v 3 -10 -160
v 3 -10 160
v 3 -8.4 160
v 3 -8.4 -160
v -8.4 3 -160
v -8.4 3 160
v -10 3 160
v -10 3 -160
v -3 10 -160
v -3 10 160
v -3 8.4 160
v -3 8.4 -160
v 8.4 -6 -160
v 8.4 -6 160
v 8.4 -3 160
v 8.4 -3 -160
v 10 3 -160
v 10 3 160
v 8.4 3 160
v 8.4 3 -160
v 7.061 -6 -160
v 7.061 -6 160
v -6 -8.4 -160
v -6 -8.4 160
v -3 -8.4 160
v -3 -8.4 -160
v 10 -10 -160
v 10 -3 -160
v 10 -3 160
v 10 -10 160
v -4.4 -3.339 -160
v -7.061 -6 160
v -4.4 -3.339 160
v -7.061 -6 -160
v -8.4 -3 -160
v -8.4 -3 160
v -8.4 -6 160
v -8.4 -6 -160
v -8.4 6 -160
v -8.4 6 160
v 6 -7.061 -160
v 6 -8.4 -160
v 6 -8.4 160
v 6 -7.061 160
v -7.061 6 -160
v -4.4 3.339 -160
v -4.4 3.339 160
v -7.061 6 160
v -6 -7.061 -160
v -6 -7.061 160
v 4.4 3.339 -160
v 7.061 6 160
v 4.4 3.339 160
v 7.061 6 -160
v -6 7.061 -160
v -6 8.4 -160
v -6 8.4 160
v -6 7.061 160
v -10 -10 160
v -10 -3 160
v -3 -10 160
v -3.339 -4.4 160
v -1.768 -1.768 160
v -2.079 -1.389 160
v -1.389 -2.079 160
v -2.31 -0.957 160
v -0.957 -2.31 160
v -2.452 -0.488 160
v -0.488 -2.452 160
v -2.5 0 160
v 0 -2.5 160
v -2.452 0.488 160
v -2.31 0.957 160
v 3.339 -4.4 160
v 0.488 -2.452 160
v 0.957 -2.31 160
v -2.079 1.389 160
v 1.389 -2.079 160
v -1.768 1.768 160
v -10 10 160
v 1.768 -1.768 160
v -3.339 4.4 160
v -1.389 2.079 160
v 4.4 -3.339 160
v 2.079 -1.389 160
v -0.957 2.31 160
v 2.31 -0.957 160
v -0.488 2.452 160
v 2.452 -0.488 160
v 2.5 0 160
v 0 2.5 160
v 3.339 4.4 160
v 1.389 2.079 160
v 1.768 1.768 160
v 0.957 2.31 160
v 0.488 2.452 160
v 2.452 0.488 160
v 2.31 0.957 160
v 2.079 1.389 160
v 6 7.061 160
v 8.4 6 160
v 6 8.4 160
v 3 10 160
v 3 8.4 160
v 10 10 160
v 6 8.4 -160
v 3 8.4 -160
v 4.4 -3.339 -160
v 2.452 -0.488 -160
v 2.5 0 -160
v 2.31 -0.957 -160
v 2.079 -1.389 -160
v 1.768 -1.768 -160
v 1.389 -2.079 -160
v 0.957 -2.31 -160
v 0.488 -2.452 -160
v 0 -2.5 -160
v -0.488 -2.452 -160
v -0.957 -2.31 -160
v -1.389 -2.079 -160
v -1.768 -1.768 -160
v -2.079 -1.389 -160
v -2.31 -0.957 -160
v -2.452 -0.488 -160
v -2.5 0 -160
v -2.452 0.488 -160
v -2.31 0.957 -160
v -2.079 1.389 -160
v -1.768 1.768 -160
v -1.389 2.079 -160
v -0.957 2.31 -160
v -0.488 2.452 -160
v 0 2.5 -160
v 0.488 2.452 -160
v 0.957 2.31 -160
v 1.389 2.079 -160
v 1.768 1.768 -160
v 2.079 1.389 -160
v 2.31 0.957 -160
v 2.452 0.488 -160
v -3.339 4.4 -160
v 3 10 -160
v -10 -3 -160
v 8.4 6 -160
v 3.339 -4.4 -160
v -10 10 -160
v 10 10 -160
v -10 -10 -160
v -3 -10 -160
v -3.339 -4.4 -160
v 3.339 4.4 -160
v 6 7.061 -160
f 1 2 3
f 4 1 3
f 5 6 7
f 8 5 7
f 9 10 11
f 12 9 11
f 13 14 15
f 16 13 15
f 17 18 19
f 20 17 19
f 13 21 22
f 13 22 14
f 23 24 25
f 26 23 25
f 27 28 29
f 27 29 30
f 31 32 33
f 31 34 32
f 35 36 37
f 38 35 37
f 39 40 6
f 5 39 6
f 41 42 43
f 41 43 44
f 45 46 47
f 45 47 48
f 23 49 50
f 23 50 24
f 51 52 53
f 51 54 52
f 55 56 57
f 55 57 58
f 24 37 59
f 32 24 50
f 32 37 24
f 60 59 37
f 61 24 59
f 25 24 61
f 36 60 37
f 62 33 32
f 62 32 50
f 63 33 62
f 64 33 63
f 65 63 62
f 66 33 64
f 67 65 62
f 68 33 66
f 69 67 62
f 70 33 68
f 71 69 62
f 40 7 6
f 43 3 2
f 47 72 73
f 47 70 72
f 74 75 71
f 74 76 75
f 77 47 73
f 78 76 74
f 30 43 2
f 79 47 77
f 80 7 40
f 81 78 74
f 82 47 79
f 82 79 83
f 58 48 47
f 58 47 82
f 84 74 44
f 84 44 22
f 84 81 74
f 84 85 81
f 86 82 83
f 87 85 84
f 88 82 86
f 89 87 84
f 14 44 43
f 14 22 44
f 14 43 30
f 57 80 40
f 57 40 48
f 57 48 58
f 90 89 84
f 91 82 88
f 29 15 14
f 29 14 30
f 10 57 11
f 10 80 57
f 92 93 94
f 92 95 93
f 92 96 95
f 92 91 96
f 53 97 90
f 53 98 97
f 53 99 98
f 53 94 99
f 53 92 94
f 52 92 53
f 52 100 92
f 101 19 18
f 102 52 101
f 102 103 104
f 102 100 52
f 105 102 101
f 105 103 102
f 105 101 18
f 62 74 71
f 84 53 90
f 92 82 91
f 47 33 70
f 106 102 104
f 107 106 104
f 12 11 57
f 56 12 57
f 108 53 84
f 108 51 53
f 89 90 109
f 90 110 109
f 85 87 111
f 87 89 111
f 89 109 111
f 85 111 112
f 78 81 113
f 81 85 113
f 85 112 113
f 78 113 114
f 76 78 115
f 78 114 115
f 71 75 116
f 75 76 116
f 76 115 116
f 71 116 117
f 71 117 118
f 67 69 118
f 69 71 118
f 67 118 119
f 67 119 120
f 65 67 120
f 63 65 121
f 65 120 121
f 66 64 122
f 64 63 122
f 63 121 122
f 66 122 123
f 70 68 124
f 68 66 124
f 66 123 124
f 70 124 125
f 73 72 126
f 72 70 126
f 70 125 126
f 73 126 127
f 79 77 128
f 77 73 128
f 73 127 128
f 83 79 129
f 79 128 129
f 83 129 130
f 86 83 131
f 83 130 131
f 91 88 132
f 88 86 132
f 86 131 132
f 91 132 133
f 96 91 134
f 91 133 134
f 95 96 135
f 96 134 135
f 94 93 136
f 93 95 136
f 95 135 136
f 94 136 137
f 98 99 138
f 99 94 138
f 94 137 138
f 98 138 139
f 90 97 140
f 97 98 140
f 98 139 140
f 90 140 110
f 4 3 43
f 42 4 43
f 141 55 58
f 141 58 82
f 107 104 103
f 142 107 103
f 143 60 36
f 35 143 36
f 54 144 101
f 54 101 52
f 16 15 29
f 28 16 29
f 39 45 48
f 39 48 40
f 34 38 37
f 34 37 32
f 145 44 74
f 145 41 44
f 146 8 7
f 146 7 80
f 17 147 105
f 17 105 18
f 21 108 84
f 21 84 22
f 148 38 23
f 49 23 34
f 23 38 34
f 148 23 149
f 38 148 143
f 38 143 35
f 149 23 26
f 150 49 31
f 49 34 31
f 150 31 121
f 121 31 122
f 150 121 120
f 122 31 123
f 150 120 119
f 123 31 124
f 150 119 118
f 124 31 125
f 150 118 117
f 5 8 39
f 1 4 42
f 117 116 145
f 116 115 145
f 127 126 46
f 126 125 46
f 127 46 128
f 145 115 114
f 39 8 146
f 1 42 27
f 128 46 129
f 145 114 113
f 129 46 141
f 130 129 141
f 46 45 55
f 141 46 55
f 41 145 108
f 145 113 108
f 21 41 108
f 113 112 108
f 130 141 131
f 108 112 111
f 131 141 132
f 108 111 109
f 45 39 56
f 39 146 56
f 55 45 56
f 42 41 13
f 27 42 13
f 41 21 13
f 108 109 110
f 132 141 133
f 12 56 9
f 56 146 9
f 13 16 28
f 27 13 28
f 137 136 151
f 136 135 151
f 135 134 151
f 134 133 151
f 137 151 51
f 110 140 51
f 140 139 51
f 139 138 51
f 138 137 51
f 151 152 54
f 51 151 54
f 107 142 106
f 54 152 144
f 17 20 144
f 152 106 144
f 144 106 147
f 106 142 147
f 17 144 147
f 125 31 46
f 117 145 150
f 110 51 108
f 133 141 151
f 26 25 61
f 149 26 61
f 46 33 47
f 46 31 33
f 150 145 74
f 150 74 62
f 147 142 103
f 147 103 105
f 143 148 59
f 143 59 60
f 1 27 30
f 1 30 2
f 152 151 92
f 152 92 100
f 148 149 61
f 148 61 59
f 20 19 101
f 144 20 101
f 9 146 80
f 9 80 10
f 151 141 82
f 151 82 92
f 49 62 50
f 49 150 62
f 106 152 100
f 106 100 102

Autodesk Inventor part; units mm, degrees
ref_plane "YZ Plane" through (0, 0, 0) normal (1, 0, 0) x (0, 1, 0)
ref_plane "XZ Plane" through (0, 0, 0) normal (0, 1, 0) x (-1, 0, 0)
sketch "スケッチ1" plane through (0, 0, 0) normal (0, 0, 1) x (1, 0, 0)
  circle A0 centre (0, 0) radius 2.5
  line L0 (-10, 10) -> (10, 10) construction
  line L1 (10, 10) -> (10, -10) construction
  line L2 (10, -10) -> (-10, -10) construction
  line L3 (-10, -10) -> (-10, 10) construction
  line L4 (-3, 10) -> (-3, 8.4) construction
  line L5 (-3, 8.4) -> (-6, 8.4) construction
  line L6 (-6, 8.4) -> (-6, 7.0607) construction
  line L7 (-6, 7.0607) -> (-3.3393, 4.4) construction
  line L8 (-3.3393, 4.4) -> (3.3393, 4.4) construction
  line L9 (3.3393, 4.4) -> (6, 7.0607) construction
  line L10 (6, 7.0607) -> (6, 8.4) construction
  line L11 (6, 8.4) -> (3, 8.4) construction
  line L12 (3, 8.4) -> (3, 10) construction
  line L13 (-10, 10) -> (10, -10) construction
  line L14 (-10, 10) -> (-3, 10)
  line L15 (-3, 10) -> (-3, 8.4)
  line L16 (-3, 8.4) -> (-6, 8.4)
  line L17 (-6, 8.4) -> (-6, 7.0607)
  line L18 (-6, 7.0607) -> (-3.3393, 4.4)
  line L19 (-3.3393, 4.4) -> (3.3393, 4.4)
  line L20 (3.3393, 4.4) -> (6, 7.0607)
  line L21 (6, 7.0607) -> (6, 8.4)
  line L22 (6, 8.4) -> (3, 8.4)
  line L23 (3, 8.4) -> (3, 10)
  line L24 (3, 10) -> (10, 10)
  line L25 (-10, -10) -> (-10, -3)
  line L26 (-10, -3) -> (-8.4, -3)
  line L27 (-8.4, -3) -> (-8.4, -6)
  line L28 (-8.4, -6) -> (-7.0607, -6)
  line L29 (-7.0607, -6) -> (-4.4, -3.3393)
  line L30 (-4.4, -3.3393) -> (-4.4, 3.3393)
  line L31 (-4.4, 3.3393) -> (-7.0607, 6)
  line L32 (-8.4, 6) -> (-8.4, 3)
  line L33 (-7.0607, 6) -> (-8.4, 6)
  line L34 (-8.4, 3) -> (-10, 3)
  line L35 (-10, 3) -> (-10, 10)
  line L36 (10, -10) -> (3, -10)
  line L37 (3, -10) -> (3, -8.4)
  line L38 (3, -8.4) -> (6, -8.4)
  line L39 (6, -8.4) -> (6, -7.0607)
  line L40 (6, -7.0607) -> (3.3393, -4.4)
  line L41 (3.3393, -4.4) -> (-3.3393, -4.4)
  line L42 (-3.3393, -4.4) -> (-6, -7.0607)
  line L43 (-6, -8.4) -> (-3, -8.4)
  line L44 (-6, -7.0607) -> (-6, -8.4)
  line L45 (-3, -8.4) -> (-3, -10)
  line L46 (-3, -10) -> (-10, -10)
  line L47 (10, 10) -> (10, 3)
  line L48 (10, 3) -> (8.4, 3)
  line L49 (8.4, 3) -> (8.4, 6)
  line L50 (8.4, 6) -> (7.0607, 6)
  line L51 (7.0607, 6) -> (4.4, 3.3393)
  line L52 (4.4, 3.3393) -> (4.4, -3.3393)
  line L53 (4.4, -3.3393) -> (7.0607, -6)
  line L54 (8.4, -6) -> (8.4, -3)
  line L55 (7.0607, -6) -> (8.4, -6)
  line L56 (8.4, -3) -> (10, -3)
  line L57 (10, -3) -> (10, -10)
  point P0 (-10, 0)
  point P1 (0, 10)
  dimension "d0" = 20
  dimension "d1" = 20
  dimension "d2" = 6
  dimension "d3" = 3
  dimension "d4" = 1.6
  dimension "d5" = 4
  dimension "d6" = 12
  dimension "d7" = 6
  dimension "d8" = 135
  dimension "d9" = 135
  dimension "d10" = 0.75
  dimension "d11" = 5
  dimension "d14" = 360
extrude "押し出し1" add sketch "スケッチ1" along normal mid plane 320
equation "\"d7\" = 0.5 * d6"
equation "\"d9\" = d8"
properties part number "l320"
